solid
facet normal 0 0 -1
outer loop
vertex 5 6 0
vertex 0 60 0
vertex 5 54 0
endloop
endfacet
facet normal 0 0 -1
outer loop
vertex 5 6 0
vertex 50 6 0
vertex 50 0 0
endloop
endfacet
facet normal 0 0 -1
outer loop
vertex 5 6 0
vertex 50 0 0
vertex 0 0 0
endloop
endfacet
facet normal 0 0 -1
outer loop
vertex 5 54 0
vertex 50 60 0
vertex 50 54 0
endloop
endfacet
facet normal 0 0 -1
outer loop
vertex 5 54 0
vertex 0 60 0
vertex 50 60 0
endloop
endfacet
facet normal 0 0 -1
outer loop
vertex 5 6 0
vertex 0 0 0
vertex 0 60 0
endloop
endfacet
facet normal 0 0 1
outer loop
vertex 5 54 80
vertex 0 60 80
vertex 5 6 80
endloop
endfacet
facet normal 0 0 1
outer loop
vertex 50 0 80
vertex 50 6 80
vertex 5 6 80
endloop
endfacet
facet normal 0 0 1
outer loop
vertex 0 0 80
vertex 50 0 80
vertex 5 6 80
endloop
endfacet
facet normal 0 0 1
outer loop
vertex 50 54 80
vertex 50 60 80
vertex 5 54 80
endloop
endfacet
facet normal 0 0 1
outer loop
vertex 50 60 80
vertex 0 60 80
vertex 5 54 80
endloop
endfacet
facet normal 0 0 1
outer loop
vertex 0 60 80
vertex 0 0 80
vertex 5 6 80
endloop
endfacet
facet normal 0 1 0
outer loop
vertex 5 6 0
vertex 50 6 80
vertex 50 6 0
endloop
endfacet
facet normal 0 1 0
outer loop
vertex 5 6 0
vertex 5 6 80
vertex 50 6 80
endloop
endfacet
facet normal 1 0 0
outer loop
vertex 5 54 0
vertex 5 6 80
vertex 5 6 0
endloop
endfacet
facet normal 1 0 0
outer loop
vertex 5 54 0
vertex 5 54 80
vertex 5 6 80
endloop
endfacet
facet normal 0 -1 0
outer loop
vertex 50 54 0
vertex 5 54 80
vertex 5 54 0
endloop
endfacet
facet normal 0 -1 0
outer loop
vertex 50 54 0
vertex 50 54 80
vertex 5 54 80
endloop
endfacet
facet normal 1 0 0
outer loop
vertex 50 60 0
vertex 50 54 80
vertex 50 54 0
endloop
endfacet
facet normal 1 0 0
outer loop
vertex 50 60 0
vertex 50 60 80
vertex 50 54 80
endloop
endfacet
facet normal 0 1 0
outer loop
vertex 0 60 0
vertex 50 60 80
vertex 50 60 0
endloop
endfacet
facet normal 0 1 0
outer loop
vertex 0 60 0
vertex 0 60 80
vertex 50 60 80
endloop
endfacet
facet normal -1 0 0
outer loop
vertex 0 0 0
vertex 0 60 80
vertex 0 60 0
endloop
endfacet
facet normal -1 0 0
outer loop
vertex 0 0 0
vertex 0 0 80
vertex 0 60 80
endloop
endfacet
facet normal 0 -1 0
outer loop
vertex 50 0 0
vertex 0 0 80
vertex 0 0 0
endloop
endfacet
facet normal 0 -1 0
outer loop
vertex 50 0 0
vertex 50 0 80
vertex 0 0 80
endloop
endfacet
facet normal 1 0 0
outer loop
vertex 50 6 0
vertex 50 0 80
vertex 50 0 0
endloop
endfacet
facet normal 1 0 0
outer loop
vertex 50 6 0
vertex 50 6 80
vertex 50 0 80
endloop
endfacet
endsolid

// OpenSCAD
$fn = 32;

// ----------------------------------------------------------------------
// Structural section: channel 50 x 60 mm
// ----------------------------------------------------------------------

// --- parameters (mm) ---
sec_w = 50;               // channel width, X
sec_h = 60;               // channel height, Y
flange_t = 6;             // flange thickness
web_t = 5;                // web thickness
plate_t = 80;             // cut length, Z (extrusion height)

profile = [[0, 0], [50, 0], [50, 6], [5, 6], [5, 54], [50, 54], [50, 60], [0, 60]];  // primary outline, 8 points, counter clockwise

// --- the one profile operation ---
linear_extrude(height = plate_t) polygon(points = profile);
